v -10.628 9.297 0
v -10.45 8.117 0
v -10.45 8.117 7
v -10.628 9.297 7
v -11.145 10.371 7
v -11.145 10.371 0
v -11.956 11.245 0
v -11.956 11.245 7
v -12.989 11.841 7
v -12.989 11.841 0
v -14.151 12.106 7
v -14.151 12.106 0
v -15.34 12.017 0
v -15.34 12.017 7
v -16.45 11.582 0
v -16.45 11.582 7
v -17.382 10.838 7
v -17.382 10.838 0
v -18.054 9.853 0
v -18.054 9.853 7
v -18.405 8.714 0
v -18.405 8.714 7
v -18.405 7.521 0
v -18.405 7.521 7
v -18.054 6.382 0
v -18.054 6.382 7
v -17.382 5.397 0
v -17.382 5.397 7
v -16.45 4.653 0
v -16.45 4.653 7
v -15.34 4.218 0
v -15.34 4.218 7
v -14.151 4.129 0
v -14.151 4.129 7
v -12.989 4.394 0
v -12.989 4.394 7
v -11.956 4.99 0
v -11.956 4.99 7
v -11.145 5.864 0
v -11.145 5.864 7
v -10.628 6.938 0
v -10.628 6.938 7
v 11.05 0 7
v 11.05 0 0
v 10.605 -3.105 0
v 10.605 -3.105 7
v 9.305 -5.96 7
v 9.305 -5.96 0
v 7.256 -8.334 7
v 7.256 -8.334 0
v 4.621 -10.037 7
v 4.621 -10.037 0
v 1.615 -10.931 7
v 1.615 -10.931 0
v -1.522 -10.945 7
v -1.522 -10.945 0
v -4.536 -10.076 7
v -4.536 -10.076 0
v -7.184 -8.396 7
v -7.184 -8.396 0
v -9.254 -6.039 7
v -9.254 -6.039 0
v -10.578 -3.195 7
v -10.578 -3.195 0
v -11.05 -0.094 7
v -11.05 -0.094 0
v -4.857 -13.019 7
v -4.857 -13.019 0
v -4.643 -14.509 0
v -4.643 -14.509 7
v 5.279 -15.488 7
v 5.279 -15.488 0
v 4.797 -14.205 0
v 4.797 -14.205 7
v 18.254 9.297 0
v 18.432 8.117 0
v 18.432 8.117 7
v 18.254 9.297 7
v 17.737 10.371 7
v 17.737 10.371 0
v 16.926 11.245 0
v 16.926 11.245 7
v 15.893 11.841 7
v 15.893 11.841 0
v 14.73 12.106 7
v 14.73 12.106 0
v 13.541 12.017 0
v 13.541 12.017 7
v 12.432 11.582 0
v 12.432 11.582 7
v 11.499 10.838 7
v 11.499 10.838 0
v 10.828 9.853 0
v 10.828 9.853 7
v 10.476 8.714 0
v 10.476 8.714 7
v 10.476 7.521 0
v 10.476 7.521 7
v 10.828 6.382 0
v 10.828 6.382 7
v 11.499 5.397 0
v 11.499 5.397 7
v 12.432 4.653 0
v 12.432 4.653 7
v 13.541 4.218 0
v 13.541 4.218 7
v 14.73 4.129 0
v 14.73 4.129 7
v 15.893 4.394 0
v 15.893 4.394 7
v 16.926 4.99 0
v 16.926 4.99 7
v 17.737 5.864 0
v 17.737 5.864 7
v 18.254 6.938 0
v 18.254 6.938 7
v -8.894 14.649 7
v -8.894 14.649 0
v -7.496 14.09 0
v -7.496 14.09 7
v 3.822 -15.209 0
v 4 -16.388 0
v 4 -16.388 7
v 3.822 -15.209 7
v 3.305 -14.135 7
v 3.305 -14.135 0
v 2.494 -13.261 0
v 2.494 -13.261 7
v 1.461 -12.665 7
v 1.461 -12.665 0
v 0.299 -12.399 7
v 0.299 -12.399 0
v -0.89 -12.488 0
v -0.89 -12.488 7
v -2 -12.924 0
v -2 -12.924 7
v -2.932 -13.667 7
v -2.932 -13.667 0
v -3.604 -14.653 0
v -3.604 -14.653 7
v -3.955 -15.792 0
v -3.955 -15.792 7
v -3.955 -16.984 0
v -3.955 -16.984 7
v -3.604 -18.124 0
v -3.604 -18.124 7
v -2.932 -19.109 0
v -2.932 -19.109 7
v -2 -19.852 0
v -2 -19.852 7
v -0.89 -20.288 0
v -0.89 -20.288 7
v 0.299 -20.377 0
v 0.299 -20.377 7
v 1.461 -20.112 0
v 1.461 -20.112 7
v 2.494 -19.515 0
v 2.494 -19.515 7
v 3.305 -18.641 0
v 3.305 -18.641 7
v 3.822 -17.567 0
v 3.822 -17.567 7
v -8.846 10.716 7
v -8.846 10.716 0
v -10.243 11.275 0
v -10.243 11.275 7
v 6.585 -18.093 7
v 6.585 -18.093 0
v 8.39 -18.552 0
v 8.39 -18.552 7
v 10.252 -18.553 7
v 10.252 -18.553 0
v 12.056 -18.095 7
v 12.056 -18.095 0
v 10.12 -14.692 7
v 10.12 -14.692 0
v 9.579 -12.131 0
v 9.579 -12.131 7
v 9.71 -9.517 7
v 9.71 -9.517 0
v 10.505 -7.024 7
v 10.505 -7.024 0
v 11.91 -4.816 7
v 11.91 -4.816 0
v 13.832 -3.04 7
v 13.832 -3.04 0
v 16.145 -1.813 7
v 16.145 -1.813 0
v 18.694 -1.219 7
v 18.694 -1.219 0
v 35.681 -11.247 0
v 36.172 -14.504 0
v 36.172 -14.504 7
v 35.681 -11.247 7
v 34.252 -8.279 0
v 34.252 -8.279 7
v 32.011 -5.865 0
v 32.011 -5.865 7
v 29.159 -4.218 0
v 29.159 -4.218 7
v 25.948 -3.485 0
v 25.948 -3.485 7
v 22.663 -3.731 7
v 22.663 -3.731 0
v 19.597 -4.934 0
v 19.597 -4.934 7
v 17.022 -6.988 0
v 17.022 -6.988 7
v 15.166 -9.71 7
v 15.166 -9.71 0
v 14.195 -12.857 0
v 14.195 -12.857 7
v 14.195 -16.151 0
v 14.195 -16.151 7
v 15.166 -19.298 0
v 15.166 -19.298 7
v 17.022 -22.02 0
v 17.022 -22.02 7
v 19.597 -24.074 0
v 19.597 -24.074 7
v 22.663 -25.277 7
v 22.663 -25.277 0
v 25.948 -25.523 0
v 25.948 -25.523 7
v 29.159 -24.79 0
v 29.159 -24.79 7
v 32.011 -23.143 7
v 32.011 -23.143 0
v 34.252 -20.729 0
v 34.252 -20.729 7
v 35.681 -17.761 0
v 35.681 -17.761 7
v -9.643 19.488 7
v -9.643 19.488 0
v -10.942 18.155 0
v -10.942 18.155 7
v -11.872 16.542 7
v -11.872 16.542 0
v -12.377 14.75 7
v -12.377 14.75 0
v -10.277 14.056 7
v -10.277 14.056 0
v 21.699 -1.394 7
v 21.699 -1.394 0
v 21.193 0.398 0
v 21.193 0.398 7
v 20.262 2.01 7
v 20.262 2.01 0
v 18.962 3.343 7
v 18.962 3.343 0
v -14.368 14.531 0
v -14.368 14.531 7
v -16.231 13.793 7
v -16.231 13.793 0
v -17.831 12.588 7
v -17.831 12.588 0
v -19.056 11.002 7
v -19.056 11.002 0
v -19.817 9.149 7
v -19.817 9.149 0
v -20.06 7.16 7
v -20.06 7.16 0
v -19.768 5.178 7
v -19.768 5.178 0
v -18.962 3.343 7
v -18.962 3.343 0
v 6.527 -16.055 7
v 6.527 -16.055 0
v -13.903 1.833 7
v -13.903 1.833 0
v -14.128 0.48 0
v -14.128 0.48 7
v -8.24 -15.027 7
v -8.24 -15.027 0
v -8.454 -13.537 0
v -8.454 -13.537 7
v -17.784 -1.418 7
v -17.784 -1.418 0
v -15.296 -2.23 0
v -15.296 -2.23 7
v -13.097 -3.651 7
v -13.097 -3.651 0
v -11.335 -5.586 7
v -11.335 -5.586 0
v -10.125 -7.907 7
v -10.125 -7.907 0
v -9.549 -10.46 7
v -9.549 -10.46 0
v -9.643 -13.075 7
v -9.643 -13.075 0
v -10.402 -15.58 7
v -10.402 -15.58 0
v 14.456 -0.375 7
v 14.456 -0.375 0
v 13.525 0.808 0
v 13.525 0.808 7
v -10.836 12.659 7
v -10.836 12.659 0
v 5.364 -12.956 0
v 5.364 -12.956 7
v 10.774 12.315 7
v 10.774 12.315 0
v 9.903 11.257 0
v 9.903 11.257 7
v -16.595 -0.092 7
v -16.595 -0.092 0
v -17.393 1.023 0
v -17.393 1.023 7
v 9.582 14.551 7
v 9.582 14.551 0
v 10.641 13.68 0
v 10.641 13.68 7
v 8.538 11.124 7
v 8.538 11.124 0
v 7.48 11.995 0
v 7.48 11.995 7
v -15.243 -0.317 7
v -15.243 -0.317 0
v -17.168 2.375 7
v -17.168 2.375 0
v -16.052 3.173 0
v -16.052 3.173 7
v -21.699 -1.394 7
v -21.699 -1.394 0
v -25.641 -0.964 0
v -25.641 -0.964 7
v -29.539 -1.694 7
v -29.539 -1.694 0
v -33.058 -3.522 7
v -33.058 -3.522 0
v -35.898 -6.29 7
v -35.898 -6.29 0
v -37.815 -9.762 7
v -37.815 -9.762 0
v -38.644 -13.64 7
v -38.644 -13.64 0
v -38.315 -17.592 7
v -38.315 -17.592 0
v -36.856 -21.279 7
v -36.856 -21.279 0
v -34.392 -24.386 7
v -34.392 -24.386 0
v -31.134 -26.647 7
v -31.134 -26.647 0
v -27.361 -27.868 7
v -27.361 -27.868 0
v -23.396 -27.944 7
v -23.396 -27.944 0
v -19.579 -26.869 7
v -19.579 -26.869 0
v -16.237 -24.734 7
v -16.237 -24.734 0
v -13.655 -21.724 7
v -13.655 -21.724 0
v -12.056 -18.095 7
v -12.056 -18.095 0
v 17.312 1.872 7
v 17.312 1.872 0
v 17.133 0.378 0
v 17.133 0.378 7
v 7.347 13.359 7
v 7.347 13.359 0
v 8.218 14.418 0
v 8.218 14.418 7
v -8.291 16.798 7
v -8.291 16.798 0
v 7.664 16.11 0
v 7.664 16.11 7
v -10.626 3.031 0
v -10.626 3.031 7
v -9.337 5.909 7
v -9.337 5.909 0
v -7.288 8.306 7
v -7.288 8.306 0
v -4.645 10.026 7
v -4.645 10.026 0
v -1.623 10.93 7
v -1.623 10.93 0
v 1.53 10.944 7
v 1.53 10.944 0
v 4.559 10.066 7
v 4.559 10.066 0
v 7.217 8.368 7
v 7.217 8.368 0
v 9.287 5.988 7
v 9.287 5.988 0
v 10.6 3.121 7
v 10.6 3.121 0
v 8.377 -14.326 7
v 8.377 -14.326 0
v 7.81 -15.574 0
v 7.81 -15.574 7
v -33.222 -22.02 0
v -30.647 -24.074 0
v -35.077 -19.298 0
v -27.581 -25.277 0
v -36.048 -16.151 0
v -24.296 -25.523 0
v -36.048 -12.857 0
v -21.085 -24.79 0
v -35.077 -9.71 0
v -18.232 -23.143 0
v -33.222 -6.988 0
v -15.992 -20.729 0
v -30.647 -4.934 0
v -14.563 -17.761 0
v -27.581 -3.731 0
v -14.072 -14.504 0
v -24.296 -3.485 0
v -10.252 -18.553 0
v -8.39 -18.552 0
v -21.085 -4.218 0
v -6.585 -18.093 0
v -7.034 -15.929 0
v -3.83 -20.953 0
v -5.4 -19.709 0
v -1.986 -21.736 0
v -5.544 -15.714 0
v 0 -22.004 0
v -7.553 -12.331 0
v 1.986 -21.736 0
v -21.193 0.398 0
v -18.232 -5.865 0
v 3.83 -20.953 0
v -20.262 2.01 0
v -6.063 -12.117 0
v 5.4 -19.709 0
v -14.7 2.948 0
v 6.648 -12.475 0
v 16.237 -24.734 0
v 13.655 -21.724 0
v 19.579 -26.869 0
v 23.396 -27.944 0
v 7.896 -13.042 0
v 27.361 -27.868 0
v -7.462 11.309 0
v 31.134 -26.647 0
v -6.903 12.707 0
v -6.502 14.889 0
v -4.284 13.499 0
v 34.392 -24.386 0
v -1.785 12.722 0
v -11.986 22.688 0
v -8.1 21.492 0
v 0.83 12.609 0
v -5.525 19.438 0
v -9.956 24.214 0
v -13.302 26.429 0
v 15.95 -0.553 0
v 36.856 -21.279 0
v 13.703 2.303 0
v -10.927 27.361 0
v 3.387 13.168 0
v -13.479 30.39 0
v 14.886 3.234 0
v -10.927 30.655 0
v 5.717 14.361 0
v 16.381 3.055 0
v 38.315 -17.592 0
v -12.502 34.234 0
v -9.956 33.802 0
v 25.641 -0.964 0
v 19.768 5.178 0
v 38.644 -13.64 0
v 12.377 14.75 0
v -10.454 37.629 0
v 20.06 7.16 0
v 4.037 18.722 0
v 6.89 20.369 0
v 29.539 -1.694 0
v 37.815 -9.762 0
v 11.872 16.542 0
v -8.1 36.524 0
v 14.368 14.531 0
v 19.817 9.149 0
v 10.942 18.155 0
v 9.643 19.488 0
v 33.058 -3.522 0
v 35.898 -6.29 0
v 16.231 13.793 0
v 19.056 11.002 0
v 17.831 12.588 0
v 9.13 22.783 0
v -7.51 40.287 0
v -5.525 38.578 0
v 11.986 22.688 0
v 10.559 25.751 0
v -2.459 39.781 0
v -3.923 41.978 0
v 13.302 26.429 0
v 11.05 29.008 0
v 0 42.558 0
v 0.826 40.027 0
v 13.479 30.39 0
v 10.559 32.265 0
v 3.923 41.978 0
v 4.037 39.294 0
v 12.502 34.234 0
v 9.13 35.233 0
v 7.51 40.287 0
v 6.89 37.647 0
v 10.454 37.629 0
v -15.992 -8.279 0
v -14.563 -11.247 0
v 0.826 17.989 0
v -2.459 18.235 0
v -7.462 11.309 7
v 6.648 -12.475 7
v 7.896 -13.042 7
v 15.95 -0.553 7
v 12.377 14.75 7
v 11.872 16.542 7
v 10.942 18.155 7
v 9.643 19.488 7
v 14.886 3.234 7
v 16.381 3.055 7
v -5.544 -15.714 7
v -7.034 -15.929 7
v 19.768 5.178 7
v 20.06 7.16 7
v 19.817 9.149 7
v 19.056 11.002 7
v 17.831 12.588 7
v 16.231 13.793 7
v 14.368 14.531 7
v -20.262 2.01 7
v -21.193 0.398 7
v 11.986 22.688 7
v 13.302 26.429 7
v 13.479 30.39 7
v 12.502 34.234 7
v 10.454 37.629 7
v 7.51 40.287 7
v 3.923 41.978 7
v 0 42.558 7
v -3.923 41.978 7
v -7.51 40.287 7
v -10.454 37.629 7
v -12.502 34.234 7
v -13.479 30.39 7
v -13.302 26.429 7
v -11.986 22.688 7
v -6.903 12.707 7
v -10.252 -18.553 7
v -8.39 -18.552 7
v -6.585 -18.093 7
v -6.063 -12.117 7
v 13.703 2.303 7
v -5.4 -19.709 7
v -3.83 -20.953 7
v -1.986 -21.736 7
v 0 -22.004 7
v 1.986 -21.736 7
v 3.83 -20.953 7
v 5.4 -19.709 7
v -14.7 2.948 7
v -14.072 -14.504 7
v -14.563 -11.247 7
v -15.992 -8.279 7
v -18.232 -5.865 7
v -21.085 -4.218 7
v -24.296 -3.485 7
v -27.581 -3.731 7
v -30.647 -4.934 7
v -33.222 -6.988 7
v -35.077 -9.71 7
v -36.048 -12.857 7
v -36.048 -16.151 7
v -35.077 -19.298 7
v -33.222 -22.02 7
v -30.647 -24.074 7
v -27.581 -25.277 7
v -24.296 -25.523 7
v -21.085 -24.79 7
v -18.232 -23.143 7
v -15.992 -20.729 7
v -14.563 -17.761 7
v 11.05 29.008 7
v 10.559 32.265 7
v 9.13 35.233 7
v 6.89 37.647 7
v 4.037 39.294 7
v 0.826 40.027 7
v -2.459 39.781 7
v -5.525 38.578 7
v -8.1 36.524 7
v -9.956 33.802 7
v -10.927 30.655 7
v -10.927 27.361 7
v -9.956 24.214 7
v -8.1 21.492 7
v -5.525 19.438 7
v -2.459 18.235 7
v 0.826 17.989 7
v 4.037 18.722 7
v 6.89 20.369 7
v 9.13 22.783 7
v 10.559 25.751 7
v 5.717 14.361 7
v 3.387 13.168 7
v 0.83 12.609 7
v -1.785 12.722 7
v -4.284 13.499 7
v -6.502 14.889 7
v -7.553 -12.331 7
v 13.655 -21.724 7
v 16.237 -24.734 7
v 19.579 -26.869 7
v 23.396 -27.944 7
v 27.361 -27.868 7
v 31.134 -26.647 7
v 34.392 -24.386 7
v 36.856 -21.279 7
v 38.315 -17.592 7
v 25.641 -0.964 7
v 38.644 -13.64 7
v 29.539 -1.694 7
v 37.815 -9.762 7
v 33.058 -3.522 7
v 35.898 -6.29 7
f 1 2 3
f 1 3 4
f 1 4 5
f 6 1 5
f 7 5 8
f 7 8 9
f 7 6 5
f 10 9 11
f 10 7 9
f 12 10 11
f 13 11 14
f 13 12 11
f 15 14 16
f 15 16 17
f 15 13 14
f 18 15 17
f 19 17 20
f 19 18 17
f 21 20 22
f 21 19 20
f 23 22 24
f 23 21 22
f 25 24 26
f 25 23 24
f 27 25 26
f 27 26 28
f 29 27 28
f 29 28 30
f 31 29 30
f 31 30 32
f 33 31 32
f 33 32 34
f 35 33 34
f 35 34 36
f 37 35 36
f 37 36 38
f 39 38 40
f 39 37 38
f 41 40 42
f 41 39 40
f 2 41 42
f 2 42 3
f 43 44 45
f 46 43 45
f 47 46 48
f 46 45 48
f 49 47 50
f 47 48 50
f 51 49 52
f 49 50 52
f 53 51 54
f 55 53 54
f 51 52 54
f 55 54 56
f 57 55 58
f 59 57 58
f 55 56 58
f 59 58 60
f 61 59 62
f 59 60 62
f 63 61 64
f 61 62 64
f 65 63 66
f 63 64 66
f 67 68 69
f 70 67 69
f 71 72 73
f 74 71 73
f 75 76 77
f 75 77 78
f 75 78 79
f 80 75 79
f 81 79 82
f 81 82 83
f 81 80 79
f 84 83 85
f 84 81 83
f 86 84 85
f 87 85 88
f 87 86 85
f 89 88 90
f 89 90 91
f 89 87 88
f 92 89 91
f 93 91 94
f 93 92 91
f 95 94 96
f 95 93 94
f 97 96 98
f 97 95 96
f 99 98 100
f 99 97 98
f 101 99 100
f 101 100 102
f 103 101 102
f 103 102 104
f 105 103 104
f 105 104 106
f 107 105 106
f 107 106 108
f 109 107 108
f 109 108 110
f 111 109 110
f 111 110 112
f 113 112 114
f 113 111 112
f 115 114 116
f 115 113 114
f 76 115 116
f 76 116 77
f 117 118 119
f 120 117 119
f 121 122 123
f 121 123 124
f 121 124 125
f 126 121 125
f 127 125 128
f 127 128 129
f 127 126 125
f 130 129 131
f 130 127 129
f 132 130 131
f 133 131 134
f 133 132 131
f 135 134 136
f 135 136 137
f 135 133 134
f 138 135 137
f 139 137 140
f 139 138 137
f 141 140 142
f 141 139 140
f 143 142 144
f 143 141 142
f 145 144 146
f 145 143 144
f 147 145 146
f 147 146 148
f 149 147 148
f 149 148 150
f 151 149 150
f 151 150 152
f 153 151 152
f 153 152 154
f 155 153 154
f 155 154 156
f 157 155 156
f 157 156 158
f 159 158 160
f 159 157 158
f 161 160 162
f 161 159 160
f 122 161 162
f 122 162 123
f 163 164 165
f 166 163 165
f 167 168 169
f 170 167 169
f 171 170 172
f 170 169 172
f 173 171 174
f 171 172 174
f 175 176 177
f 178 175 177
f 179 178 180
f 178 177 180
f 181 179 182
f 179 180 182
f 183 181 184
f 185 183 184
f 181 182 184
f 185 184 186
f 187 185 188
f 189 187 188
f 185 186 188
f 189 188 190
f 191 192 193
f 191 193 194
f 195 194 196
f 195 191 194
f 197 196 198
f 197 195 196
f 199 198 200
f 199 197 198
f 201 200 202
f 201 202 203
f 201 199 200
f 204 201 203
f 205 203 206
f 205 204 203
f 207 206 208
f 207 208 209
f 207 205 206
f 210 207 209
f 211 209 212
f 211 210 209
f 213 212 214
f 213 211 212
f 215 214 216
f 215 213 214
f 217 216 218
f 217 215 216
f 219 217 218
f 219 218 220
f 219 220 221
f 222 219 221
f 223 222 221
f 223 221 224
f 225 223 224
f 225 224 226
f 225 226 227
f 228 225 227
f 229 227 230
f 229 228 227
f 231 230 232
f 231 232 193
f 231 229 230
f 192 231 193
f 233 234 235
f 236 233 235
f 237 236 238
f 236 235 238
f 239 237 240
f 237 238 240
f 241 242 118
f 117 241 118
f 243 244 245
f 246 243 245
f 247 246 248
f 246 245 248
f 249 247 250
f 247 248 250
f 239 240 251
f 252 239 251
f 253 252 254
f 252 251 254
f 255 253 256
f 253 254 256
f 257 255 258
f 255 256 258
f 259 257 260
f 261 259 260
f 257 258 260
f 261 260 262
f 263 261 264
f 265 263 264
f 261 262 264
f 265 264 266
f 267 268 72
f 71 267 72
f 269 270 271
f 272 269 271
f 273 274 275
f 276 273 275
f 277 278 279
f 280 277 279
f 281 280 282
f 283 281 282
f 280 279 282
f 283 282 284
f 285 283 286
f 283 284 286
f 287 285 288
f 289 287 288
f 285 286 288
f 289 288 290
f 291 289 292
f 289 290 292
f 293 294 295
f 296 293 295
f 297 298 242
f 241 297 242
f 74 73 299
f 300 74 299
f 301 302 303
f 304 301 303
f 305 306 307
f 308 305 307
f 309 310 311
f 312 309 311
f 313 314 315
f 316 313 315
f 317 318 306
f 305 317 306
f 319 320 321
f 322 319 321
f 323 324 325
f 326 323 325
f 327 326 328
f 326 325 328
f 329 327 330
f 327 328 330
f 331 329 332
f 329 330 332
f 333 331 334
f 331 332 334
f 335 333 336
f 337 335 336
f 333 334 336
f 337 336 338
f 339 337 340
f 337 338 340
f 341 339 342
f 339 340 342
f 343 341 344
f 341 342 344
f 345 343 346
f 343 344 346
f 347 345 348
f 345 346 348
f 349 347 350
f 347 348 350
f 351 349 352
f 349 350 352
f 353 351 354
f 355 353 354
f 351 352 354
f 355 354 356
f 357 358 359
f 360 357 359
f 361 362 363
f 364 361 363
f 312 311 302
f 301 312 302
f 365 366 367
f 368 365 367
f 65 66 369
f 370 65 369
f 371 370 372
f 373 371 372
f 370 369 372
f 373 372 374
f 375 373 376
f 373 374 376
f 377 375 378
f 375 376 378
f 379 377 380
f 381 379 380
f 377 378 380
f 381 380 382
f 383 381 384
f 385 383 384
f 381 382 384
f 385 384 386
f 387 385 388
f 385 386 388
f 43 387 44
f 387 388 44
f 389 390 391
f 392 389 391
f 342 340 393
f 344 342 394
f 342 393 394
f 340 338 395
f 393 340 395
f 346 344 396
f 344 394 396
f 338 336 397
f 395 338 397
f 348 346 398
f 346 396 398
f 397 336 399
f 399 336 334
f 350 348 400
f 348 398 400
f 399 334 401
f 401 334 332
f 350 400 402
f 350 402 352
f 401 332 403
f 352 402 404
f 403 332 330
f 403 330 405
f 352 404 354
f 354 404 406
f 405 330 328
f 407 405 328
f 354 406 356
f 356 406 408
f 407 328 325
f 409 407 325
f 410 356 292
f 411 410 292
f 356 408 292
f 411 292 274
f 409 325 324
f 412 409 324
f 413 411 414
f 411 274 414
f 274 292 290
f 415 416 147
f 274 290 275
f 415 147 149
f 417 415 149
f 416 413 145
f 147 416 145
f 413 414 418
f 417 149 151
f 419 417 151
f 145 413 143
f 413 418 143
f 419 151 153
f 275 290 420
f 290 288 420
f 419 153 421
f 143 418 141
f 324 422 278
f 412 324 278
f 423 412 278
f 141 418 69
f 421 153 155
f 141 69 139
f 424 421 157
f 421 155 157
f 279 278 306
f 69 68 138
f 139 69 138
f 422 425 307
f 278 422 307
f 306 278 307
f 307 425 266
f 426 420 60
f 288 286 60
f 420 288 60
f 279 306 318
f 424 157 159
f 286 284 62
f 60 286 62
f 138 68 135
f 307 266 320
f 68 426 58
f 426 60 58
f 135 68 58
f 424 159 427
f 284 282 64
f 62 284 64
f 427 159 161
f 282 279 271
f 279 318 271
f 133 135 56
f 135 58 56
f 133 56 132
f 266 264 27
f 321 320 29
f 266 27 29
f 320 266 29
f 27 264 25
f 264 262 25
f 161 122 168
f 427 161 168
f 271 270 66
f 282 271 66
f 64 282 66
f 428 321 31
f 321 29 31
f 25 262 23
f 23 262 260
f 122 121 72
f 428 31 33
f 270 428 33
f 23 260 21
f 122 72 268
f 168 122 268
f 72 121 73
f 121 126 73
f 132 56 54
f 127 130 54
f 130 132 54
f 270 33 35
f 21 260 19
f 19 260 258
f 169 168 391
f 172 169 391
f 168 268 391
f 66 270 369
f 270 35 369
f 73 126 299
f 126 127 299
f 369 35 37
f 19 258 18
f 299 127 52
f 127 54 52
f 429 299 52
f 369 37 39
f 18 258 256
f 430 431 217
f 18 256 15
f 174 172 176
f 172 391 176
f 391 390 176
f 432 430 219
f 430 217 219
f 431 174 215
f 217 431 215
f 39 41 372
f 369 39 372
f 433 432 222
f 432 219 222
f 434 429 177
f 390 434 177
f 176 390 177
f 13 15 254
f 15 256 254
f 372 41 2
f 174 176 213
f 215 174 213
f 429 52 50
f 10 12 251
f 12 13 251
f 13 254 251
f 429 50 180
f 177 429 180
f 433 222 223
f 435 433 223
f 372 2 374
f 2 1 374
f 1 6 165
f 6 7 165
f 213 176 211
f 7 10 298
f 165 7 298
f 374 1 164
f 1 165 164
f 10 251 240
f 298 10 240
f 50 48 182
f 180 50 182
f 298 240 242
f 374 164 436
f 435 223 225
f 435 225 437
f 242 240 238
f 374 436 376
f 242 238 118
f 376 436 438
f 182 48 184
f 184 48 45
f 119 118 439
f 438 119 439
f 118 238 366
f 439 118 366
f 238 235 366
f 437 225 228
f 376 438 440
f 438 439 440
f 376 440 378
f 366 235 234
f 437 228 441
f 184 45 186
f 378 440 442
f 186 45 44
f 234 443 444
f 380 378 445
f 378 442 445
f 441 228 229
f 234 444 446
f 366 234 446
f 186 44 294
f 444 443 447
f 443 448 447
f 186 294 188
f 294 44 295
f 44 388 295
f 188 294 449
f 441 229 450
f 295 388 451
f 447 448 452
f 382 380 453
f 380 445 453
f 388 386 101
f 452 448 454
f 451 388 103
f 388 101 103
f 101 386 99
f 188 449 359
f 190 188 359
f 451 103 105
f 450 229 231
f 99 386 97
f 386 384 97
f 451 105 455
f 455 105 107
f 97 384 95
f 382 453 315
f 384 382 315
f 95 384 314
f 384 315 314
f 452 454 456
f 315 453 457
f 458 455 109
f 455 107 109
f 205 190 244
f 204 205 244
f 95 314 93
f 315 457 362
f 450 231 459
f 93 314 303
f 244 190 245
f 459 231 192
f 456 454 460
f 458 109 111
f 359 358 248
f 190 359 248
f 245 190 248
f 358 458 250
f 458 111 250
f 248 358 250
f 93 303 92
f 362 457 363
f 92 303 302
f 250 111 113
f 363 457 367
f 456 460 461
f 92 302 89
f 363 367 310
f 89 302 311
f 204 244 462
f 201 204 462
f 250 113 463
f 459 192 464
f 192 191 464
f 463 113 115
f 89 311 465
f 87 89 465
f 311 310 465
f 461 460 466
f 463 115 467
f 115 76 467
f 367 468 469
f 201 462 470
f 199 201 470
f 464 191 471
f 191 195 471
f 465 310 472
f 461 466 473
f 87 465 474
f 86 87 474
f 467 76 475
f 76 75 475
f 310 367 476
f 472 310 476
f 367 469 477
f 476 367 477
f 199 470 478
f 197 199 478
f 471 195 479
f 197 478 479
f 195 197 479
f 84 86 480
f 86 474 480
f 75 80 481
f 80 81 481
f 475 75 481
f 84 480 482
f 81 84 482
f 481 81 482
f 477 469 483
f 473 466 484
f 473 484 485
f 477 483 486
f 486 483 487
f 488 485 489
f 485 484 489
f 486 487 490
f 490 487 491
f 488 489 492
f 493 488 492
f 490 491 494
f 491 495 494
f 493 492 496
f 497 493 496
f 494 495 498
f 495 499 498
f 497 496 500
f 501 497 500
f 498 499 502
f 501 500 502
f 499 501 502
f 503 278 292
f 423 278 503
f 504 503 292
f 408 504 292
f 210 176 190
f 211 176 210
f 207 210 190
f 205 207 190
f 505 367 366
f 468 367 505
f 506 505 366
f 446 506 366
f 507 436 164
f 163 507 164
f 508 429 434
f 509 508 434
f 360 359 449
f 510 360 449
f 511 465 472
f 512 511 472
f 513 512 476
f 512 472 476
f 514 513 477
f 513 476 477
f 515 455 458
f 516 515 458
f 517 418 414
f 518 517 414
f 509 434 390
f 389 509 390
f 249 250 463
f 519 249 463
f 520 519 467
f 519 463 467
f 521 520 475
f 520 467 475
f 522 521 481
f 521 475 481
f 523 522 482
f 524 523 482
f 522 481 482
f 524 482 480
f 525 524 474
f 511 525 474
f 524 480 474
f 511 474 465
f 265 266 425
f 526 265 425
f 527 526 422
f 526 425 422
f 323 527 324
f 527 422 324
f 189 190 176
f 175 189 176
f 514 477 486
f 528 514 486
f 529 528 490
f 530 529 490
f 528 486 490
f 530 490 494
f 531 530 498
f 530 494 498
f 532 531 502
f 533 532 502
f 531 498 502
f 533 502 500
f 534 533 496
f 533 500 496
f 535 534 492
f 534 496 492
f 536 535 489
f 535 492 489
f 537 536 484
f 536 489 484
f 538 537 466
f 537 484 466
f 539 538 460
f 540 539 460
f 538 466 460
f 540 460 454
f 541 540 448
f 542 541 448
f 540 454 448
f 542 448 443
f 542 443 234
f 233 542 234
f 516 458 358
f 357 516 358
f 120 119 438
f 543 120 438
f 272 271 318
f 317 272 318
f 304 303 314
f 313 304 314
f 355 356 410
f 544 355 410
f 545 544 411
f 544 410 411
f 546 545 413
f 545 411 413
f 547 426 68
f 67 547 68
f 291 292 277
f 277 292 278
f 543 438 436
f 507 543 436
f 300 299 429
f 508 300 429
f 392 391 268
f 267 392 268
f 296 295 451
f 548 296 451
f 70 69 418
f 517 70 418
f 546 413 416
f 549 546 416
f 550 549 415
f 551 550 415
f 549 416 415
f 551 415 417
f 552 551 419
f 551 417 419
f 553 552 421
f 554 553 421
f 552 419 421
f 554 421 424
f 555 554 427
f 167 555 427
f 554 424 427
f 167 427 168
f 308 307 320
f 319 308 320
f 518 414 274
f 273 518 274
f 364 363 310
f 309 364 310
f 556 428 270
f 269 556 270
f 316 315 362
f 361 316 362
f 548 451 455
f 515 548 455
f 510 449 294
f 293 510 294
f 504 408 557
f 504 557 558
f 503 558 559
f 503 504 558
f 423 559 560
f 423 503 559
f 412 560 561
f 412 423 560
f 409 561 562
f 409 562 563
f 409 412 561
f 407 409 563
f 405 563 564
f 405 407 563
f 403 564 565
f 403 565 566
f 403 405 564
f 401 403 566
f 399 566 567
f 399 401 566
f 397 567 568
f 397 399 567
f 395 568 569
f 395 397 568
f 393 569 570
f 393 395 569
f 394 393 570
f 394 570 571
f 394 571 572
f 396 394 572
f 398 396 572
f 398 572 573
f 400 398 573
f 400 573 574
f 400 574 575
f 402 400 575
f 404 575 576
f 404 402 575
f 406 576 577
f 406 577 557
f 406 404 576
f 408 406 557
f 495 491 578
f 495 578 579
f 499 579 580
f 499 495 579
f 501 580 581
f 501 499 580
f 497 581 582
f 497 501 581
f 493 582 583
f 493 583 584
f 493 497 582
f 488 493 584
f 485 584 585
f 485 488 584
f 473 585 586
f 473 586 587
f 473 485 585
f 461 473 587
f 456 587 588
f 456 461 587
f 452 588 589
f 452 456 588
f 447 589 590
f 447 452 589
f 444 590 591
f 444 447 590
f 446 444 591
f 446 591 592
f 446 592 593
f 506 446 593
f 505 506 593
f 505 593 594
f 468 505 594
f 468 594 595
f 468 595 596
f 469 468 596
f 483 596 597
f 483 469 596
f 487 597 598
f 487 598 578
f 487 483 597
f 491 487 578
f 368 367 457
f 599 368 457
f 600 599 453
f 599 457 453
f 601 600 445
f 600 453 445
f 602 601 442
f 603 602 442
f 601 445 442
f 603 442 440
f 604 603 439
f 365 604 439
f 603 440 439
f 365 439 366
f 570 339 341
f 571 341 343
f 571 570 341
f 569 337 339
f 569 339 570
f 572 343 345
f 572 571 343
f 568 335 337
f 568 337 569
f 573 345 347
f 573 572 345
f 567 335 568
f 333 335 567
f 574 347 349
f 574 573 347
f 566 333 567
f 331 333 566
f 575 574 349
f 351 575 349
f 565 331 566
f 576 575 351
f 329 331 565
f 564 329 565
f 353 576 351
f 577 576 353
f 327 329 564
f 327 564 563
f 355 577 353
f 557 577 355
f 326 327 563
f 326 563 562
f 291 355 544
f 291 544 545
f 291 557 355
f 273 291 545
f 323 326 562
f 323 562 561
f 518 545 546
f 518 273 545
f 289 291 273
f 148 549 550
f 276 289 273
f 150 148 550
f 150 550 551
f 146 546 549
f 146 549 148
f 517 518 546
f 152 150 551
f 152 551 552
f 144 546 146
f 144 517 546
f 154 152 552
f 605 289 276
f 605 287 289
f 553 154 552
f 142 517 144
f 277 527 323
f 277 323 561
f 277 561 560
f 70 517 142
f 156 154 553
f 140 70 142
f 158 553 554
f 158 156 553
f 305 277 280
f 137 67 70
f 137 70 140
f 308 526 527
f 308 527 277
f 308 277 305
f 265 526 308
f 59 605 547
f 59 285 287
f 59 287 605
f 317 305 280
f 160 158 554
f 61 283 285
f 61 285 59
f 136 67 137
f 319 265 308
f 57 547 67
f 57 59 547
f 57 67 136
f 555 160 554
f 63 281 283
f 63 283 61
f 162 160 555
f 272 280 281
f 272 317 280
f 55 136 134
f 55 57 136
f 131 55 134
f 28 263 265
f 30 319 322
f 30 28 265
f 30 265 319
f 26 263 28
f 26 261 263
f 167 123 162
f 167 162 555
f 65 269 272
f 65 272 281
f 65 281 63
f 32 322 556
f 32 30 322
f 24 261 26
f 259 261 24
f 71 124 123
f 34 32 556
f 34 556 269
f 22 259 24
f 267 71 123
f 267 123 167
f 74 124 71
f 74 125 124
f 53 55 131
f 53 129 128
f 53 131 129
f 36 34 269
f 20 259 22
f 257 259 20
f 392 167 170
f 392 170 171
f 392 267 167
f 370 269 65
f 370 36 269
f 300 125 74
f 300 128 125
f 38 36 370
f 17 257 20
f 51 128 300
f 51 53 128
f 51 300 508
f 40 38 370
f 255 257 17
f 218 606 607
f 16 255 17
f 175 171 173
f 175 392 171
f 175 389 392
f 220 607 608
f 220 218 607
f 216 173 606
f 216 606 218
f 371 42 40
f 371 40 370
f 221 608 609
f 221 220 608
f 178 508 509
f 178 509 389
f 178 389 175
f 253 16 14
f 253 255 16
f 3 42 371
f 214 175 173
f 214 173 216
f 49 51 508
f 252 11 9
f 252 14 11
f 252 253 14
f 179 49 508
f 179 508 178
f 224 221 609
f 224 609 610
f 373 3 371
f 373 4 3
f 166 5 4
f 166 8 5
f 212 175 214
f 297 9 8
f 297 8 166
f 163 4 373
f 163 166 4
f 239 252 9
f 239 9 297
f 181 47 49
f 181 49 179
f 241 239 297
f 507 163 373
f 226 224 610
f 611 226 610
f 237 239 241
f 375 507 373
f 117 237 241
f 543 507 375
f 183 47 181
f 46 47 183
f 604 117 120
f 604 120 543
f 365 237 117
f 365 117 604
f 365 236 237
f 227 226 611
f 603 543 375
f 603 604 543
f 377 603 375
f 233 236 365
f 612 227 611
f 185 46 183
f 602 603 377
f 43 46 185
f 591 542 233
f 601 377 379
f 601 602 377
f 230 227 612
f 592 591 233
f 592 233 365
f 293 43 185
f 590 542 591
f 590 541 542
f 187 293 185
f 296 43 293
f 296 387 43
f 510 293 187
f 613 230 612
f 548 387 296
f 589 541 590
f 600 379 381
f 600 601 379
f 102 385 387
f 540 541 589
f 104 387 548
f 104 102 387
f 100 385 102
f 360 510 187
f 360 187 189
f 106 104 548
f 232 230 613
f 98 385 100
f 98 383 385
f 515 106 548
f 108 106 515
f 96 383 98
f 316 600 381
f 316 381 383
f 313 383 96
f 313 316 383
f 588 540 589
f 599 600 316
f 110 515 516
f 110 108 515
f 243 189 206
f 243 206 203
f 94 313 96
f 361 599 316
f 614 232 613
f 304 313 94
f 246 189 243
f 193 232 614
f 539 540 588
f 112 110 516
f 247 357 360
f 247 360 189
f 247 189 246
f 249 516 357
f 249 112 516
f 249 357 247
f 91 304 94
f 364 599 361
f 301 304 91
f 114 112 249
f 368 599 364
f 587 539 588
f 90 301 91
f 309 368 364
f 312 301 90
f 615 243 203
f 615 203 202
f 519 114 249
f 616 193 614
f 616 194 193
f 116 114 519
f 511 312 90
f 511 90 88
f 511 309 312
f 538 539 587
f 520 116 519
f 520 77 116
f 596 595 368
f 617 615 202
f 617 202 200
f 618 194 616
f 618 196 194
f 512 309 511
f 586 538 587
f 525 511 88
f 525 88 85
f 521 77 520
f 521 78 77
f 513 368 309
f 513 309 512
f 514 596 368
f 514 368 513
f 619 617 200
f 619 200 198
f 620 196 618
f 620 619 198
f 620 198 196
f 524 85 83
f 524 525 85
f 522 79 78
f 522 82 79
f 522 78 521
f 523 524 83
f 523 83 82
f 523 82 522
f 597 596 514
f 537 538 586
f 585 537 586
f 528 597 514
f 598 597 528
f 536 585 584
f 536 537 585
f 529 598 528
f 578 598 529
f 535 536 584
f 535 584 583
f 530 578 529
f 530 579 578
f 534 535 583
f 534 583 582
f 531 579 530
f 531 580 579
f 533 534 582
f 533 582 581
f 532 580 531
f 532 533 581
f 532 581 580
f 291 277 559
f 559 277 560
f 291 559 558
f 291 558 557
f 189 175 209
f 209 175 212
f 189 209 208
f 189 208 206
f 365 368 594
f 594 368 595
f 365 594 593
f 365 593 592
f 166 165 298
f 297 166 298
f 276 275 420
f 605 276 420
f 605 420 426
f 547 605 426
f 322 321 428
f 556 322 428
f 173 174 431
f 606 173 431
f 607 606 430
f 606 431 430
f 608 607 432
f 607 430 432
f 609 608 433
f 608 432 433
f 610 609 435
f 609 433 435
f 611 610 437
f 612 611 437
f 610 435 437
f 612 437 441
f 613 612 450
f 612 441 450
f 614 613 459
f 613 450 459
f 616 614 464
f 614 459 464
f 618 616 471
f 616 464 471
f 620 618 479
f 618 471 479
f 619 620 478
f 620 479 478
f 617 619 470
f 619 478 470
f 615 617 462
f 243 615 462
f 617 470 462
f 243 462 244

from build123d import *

# Parameters (mm, degrees)
F0_R     = 11.05
F0_R_2   = 4
F1_DEPTH = 7


with BuildPart() as f1:
    # F0 (on Top) → F1 (new body)
    with BuildSketch(Plane.XY):
        with BuildLine():
            ThreePointArc((-18.961918, 3.343498), (-20.777697, 1.23345), (-21.698821, -1.393503))
            ThreePointArc((-21.698821, -1.393503), (-36.856378, -21.27904), (-12.05622, -18.094979))
            ThreePointArc((-12.05622, -18.094979), (-9.320649, -18.610739), (-6.585405, -18.093251))
            ThreePointArc((-6.585405, -18.093251), (0, -22.00404), (6.585405, -18.093251))
            ThreePointArc((6.585405, -18.093251), (9.320649, -18.610739), (12.05622, -18.094979))
            ThreePointArc((12.05622, -18.094979), (36.856378, -21.27904), (21.698821, -1.393503))
            ThreePointArc((21.698821, -1.393503), (20.777697, 1.23345), (18.961918, 3.343498))
            ThreePointArc((18.961918, 3.343498), (19.056057, 11.00202), (12.376513, 14.749754))
            ThreePointArc((12.376513, 14.749754), (11.457048, 17.377288), (9.642601, 19.488482))
            ThreePointArc((9.642601, 19.488482), (0, 42.558079), (-9.642601, 19.488482))
            ThreePointArc((-9.642601, 19.488482), (-11.457048, 17.377288), (-12.376513, 14.749754))
            ThreePointArc((-12.376513, 14.749754), (-19.056057, 11.00202), (-18.961918, 3.343498))
        make_face()
        with Locations((-25.121734, -14.50404)):
            Circle(F0_R, mode=Mode.SUBTRACT)
        Polygon((-8.239777, -15.026816), (-8.454451, -13.536826), (-7.552666, -12.331446), (-6.062676, -12.116772), (-4.857296, -13.018557), (-4.642622, -14.508547), (-5.544407, -15.713927), (-7.034397, -15.928601), align=None, mode=Mode.SUBTRACT)
        with BuildLine():
            ThreePointArc((-17.783627, -1.417626), (-10.655181, -6.70699), (-10.402175, -15.579877))
            Line((-10.402175, -15.579877), (-17.783627, -1.417626))
        make_face(mode=Mode.SUBTRACT)
        Polygon((-15.243006, -0.317038), (-16.595347, -0.092157), (-17.392582, 1.023107), (-17.167701, 2.375449), (-16.052436, 3.172683), (-14.700095, 2.947802), (-13.90286, 1.832538), (-14.127741, 0.480197), align=None, mode=Mode.SUBTRACT)
        with Locations((0, -16.388141)):
            Circle(F0_R_2, mode=Mode.SUBTRACT)
        Polygon((7.896066, -13.042311), (8.377484, -14.325914), (7.810254, -15.573972), (6.526652, -16.055389), (5.278594, -15.488159), (4.797176, -14.204557), (5.364406, -12.956499), (6.648008, -12.475081), align=None, mode=Mode.SUBTRACT)
        with Locations((25.121734, -14.50404)):
            Circle(F0_R, mode=Mode.SUBTRACT)
        with BuildLine():
            ThreePointArc((10.119514, -14.69226), (11.136014, -5.874162), (18.693656, -1.218609))
            Line((18.693656, -1.218609), (10.119514, -14.69226))
        make_face(mode=Mode.SUBTRACT)
        with BuildLine():
            ThreePointArc((-11.049599, -0.09414), (-0.047071, 11.0499), (11.05, 0))
            ThreePointArc((11.05, 0), (0.047071, -11.0499), (-11.049599, -0.09414))
        make_face(mode=Mode.SUBTRACT)
        Polygon((17.133493, 0.377552), (15.95046, -0.553356), (14.455679, -0.375077), (13.524771, 0.807955), (13.703049, 2.302737), (14.886082, 3.233645), (16.380863, 3.055366), (17.311772, 1.872334), align=None, mode=Mode.SUBTRACT)
        with Locations((-14.450066, 8.117487)):
            Circle(F0_R_2, mode=Mode.SUBTRACT)
        Polygon((-7.49601, 14.090182), (-6.903013, 12.706524), (-7.462095, 11.308817), (-8.845753, 10.71582), (-10.243459, 11.274903), (-10.836456, 12.658561), (-10.277374, 14.056267), (-8.893716, 14.649264), align=None, mode=Mode.SUBTRACT)
        with BuildLine():
            ThreePointArc((7.664113, 16.109886), (-0.480834, 12.581152), (-8.291482, 16.798486))
            Line((-8.291482, 16.798486), (7.664113, 16.109886))
        make_face(mode=Mode.SUBTRACT)
        Polygon((10.641049, 13.679941), (10.773843, 12.315476), (9.902919, 11.256755), (8.538454, 11.123961), (7.479733, 11.994885), (7.34694, 13.35935), (8.217863, 14.418071), (9.582328, 14.550864), align=None, mode=Mode.SUBTRACT)
        with Locations((14.431565, 8.117487)):
            Circle(F0_R_2, mode=Mode.SUBTRACT)
        with Locations((0, 29.008079)):
            Circle(F0_R, mode=Mode.SUBTRACT)
    extrude(amount=F1_DEPTH)


solid = f1.part
